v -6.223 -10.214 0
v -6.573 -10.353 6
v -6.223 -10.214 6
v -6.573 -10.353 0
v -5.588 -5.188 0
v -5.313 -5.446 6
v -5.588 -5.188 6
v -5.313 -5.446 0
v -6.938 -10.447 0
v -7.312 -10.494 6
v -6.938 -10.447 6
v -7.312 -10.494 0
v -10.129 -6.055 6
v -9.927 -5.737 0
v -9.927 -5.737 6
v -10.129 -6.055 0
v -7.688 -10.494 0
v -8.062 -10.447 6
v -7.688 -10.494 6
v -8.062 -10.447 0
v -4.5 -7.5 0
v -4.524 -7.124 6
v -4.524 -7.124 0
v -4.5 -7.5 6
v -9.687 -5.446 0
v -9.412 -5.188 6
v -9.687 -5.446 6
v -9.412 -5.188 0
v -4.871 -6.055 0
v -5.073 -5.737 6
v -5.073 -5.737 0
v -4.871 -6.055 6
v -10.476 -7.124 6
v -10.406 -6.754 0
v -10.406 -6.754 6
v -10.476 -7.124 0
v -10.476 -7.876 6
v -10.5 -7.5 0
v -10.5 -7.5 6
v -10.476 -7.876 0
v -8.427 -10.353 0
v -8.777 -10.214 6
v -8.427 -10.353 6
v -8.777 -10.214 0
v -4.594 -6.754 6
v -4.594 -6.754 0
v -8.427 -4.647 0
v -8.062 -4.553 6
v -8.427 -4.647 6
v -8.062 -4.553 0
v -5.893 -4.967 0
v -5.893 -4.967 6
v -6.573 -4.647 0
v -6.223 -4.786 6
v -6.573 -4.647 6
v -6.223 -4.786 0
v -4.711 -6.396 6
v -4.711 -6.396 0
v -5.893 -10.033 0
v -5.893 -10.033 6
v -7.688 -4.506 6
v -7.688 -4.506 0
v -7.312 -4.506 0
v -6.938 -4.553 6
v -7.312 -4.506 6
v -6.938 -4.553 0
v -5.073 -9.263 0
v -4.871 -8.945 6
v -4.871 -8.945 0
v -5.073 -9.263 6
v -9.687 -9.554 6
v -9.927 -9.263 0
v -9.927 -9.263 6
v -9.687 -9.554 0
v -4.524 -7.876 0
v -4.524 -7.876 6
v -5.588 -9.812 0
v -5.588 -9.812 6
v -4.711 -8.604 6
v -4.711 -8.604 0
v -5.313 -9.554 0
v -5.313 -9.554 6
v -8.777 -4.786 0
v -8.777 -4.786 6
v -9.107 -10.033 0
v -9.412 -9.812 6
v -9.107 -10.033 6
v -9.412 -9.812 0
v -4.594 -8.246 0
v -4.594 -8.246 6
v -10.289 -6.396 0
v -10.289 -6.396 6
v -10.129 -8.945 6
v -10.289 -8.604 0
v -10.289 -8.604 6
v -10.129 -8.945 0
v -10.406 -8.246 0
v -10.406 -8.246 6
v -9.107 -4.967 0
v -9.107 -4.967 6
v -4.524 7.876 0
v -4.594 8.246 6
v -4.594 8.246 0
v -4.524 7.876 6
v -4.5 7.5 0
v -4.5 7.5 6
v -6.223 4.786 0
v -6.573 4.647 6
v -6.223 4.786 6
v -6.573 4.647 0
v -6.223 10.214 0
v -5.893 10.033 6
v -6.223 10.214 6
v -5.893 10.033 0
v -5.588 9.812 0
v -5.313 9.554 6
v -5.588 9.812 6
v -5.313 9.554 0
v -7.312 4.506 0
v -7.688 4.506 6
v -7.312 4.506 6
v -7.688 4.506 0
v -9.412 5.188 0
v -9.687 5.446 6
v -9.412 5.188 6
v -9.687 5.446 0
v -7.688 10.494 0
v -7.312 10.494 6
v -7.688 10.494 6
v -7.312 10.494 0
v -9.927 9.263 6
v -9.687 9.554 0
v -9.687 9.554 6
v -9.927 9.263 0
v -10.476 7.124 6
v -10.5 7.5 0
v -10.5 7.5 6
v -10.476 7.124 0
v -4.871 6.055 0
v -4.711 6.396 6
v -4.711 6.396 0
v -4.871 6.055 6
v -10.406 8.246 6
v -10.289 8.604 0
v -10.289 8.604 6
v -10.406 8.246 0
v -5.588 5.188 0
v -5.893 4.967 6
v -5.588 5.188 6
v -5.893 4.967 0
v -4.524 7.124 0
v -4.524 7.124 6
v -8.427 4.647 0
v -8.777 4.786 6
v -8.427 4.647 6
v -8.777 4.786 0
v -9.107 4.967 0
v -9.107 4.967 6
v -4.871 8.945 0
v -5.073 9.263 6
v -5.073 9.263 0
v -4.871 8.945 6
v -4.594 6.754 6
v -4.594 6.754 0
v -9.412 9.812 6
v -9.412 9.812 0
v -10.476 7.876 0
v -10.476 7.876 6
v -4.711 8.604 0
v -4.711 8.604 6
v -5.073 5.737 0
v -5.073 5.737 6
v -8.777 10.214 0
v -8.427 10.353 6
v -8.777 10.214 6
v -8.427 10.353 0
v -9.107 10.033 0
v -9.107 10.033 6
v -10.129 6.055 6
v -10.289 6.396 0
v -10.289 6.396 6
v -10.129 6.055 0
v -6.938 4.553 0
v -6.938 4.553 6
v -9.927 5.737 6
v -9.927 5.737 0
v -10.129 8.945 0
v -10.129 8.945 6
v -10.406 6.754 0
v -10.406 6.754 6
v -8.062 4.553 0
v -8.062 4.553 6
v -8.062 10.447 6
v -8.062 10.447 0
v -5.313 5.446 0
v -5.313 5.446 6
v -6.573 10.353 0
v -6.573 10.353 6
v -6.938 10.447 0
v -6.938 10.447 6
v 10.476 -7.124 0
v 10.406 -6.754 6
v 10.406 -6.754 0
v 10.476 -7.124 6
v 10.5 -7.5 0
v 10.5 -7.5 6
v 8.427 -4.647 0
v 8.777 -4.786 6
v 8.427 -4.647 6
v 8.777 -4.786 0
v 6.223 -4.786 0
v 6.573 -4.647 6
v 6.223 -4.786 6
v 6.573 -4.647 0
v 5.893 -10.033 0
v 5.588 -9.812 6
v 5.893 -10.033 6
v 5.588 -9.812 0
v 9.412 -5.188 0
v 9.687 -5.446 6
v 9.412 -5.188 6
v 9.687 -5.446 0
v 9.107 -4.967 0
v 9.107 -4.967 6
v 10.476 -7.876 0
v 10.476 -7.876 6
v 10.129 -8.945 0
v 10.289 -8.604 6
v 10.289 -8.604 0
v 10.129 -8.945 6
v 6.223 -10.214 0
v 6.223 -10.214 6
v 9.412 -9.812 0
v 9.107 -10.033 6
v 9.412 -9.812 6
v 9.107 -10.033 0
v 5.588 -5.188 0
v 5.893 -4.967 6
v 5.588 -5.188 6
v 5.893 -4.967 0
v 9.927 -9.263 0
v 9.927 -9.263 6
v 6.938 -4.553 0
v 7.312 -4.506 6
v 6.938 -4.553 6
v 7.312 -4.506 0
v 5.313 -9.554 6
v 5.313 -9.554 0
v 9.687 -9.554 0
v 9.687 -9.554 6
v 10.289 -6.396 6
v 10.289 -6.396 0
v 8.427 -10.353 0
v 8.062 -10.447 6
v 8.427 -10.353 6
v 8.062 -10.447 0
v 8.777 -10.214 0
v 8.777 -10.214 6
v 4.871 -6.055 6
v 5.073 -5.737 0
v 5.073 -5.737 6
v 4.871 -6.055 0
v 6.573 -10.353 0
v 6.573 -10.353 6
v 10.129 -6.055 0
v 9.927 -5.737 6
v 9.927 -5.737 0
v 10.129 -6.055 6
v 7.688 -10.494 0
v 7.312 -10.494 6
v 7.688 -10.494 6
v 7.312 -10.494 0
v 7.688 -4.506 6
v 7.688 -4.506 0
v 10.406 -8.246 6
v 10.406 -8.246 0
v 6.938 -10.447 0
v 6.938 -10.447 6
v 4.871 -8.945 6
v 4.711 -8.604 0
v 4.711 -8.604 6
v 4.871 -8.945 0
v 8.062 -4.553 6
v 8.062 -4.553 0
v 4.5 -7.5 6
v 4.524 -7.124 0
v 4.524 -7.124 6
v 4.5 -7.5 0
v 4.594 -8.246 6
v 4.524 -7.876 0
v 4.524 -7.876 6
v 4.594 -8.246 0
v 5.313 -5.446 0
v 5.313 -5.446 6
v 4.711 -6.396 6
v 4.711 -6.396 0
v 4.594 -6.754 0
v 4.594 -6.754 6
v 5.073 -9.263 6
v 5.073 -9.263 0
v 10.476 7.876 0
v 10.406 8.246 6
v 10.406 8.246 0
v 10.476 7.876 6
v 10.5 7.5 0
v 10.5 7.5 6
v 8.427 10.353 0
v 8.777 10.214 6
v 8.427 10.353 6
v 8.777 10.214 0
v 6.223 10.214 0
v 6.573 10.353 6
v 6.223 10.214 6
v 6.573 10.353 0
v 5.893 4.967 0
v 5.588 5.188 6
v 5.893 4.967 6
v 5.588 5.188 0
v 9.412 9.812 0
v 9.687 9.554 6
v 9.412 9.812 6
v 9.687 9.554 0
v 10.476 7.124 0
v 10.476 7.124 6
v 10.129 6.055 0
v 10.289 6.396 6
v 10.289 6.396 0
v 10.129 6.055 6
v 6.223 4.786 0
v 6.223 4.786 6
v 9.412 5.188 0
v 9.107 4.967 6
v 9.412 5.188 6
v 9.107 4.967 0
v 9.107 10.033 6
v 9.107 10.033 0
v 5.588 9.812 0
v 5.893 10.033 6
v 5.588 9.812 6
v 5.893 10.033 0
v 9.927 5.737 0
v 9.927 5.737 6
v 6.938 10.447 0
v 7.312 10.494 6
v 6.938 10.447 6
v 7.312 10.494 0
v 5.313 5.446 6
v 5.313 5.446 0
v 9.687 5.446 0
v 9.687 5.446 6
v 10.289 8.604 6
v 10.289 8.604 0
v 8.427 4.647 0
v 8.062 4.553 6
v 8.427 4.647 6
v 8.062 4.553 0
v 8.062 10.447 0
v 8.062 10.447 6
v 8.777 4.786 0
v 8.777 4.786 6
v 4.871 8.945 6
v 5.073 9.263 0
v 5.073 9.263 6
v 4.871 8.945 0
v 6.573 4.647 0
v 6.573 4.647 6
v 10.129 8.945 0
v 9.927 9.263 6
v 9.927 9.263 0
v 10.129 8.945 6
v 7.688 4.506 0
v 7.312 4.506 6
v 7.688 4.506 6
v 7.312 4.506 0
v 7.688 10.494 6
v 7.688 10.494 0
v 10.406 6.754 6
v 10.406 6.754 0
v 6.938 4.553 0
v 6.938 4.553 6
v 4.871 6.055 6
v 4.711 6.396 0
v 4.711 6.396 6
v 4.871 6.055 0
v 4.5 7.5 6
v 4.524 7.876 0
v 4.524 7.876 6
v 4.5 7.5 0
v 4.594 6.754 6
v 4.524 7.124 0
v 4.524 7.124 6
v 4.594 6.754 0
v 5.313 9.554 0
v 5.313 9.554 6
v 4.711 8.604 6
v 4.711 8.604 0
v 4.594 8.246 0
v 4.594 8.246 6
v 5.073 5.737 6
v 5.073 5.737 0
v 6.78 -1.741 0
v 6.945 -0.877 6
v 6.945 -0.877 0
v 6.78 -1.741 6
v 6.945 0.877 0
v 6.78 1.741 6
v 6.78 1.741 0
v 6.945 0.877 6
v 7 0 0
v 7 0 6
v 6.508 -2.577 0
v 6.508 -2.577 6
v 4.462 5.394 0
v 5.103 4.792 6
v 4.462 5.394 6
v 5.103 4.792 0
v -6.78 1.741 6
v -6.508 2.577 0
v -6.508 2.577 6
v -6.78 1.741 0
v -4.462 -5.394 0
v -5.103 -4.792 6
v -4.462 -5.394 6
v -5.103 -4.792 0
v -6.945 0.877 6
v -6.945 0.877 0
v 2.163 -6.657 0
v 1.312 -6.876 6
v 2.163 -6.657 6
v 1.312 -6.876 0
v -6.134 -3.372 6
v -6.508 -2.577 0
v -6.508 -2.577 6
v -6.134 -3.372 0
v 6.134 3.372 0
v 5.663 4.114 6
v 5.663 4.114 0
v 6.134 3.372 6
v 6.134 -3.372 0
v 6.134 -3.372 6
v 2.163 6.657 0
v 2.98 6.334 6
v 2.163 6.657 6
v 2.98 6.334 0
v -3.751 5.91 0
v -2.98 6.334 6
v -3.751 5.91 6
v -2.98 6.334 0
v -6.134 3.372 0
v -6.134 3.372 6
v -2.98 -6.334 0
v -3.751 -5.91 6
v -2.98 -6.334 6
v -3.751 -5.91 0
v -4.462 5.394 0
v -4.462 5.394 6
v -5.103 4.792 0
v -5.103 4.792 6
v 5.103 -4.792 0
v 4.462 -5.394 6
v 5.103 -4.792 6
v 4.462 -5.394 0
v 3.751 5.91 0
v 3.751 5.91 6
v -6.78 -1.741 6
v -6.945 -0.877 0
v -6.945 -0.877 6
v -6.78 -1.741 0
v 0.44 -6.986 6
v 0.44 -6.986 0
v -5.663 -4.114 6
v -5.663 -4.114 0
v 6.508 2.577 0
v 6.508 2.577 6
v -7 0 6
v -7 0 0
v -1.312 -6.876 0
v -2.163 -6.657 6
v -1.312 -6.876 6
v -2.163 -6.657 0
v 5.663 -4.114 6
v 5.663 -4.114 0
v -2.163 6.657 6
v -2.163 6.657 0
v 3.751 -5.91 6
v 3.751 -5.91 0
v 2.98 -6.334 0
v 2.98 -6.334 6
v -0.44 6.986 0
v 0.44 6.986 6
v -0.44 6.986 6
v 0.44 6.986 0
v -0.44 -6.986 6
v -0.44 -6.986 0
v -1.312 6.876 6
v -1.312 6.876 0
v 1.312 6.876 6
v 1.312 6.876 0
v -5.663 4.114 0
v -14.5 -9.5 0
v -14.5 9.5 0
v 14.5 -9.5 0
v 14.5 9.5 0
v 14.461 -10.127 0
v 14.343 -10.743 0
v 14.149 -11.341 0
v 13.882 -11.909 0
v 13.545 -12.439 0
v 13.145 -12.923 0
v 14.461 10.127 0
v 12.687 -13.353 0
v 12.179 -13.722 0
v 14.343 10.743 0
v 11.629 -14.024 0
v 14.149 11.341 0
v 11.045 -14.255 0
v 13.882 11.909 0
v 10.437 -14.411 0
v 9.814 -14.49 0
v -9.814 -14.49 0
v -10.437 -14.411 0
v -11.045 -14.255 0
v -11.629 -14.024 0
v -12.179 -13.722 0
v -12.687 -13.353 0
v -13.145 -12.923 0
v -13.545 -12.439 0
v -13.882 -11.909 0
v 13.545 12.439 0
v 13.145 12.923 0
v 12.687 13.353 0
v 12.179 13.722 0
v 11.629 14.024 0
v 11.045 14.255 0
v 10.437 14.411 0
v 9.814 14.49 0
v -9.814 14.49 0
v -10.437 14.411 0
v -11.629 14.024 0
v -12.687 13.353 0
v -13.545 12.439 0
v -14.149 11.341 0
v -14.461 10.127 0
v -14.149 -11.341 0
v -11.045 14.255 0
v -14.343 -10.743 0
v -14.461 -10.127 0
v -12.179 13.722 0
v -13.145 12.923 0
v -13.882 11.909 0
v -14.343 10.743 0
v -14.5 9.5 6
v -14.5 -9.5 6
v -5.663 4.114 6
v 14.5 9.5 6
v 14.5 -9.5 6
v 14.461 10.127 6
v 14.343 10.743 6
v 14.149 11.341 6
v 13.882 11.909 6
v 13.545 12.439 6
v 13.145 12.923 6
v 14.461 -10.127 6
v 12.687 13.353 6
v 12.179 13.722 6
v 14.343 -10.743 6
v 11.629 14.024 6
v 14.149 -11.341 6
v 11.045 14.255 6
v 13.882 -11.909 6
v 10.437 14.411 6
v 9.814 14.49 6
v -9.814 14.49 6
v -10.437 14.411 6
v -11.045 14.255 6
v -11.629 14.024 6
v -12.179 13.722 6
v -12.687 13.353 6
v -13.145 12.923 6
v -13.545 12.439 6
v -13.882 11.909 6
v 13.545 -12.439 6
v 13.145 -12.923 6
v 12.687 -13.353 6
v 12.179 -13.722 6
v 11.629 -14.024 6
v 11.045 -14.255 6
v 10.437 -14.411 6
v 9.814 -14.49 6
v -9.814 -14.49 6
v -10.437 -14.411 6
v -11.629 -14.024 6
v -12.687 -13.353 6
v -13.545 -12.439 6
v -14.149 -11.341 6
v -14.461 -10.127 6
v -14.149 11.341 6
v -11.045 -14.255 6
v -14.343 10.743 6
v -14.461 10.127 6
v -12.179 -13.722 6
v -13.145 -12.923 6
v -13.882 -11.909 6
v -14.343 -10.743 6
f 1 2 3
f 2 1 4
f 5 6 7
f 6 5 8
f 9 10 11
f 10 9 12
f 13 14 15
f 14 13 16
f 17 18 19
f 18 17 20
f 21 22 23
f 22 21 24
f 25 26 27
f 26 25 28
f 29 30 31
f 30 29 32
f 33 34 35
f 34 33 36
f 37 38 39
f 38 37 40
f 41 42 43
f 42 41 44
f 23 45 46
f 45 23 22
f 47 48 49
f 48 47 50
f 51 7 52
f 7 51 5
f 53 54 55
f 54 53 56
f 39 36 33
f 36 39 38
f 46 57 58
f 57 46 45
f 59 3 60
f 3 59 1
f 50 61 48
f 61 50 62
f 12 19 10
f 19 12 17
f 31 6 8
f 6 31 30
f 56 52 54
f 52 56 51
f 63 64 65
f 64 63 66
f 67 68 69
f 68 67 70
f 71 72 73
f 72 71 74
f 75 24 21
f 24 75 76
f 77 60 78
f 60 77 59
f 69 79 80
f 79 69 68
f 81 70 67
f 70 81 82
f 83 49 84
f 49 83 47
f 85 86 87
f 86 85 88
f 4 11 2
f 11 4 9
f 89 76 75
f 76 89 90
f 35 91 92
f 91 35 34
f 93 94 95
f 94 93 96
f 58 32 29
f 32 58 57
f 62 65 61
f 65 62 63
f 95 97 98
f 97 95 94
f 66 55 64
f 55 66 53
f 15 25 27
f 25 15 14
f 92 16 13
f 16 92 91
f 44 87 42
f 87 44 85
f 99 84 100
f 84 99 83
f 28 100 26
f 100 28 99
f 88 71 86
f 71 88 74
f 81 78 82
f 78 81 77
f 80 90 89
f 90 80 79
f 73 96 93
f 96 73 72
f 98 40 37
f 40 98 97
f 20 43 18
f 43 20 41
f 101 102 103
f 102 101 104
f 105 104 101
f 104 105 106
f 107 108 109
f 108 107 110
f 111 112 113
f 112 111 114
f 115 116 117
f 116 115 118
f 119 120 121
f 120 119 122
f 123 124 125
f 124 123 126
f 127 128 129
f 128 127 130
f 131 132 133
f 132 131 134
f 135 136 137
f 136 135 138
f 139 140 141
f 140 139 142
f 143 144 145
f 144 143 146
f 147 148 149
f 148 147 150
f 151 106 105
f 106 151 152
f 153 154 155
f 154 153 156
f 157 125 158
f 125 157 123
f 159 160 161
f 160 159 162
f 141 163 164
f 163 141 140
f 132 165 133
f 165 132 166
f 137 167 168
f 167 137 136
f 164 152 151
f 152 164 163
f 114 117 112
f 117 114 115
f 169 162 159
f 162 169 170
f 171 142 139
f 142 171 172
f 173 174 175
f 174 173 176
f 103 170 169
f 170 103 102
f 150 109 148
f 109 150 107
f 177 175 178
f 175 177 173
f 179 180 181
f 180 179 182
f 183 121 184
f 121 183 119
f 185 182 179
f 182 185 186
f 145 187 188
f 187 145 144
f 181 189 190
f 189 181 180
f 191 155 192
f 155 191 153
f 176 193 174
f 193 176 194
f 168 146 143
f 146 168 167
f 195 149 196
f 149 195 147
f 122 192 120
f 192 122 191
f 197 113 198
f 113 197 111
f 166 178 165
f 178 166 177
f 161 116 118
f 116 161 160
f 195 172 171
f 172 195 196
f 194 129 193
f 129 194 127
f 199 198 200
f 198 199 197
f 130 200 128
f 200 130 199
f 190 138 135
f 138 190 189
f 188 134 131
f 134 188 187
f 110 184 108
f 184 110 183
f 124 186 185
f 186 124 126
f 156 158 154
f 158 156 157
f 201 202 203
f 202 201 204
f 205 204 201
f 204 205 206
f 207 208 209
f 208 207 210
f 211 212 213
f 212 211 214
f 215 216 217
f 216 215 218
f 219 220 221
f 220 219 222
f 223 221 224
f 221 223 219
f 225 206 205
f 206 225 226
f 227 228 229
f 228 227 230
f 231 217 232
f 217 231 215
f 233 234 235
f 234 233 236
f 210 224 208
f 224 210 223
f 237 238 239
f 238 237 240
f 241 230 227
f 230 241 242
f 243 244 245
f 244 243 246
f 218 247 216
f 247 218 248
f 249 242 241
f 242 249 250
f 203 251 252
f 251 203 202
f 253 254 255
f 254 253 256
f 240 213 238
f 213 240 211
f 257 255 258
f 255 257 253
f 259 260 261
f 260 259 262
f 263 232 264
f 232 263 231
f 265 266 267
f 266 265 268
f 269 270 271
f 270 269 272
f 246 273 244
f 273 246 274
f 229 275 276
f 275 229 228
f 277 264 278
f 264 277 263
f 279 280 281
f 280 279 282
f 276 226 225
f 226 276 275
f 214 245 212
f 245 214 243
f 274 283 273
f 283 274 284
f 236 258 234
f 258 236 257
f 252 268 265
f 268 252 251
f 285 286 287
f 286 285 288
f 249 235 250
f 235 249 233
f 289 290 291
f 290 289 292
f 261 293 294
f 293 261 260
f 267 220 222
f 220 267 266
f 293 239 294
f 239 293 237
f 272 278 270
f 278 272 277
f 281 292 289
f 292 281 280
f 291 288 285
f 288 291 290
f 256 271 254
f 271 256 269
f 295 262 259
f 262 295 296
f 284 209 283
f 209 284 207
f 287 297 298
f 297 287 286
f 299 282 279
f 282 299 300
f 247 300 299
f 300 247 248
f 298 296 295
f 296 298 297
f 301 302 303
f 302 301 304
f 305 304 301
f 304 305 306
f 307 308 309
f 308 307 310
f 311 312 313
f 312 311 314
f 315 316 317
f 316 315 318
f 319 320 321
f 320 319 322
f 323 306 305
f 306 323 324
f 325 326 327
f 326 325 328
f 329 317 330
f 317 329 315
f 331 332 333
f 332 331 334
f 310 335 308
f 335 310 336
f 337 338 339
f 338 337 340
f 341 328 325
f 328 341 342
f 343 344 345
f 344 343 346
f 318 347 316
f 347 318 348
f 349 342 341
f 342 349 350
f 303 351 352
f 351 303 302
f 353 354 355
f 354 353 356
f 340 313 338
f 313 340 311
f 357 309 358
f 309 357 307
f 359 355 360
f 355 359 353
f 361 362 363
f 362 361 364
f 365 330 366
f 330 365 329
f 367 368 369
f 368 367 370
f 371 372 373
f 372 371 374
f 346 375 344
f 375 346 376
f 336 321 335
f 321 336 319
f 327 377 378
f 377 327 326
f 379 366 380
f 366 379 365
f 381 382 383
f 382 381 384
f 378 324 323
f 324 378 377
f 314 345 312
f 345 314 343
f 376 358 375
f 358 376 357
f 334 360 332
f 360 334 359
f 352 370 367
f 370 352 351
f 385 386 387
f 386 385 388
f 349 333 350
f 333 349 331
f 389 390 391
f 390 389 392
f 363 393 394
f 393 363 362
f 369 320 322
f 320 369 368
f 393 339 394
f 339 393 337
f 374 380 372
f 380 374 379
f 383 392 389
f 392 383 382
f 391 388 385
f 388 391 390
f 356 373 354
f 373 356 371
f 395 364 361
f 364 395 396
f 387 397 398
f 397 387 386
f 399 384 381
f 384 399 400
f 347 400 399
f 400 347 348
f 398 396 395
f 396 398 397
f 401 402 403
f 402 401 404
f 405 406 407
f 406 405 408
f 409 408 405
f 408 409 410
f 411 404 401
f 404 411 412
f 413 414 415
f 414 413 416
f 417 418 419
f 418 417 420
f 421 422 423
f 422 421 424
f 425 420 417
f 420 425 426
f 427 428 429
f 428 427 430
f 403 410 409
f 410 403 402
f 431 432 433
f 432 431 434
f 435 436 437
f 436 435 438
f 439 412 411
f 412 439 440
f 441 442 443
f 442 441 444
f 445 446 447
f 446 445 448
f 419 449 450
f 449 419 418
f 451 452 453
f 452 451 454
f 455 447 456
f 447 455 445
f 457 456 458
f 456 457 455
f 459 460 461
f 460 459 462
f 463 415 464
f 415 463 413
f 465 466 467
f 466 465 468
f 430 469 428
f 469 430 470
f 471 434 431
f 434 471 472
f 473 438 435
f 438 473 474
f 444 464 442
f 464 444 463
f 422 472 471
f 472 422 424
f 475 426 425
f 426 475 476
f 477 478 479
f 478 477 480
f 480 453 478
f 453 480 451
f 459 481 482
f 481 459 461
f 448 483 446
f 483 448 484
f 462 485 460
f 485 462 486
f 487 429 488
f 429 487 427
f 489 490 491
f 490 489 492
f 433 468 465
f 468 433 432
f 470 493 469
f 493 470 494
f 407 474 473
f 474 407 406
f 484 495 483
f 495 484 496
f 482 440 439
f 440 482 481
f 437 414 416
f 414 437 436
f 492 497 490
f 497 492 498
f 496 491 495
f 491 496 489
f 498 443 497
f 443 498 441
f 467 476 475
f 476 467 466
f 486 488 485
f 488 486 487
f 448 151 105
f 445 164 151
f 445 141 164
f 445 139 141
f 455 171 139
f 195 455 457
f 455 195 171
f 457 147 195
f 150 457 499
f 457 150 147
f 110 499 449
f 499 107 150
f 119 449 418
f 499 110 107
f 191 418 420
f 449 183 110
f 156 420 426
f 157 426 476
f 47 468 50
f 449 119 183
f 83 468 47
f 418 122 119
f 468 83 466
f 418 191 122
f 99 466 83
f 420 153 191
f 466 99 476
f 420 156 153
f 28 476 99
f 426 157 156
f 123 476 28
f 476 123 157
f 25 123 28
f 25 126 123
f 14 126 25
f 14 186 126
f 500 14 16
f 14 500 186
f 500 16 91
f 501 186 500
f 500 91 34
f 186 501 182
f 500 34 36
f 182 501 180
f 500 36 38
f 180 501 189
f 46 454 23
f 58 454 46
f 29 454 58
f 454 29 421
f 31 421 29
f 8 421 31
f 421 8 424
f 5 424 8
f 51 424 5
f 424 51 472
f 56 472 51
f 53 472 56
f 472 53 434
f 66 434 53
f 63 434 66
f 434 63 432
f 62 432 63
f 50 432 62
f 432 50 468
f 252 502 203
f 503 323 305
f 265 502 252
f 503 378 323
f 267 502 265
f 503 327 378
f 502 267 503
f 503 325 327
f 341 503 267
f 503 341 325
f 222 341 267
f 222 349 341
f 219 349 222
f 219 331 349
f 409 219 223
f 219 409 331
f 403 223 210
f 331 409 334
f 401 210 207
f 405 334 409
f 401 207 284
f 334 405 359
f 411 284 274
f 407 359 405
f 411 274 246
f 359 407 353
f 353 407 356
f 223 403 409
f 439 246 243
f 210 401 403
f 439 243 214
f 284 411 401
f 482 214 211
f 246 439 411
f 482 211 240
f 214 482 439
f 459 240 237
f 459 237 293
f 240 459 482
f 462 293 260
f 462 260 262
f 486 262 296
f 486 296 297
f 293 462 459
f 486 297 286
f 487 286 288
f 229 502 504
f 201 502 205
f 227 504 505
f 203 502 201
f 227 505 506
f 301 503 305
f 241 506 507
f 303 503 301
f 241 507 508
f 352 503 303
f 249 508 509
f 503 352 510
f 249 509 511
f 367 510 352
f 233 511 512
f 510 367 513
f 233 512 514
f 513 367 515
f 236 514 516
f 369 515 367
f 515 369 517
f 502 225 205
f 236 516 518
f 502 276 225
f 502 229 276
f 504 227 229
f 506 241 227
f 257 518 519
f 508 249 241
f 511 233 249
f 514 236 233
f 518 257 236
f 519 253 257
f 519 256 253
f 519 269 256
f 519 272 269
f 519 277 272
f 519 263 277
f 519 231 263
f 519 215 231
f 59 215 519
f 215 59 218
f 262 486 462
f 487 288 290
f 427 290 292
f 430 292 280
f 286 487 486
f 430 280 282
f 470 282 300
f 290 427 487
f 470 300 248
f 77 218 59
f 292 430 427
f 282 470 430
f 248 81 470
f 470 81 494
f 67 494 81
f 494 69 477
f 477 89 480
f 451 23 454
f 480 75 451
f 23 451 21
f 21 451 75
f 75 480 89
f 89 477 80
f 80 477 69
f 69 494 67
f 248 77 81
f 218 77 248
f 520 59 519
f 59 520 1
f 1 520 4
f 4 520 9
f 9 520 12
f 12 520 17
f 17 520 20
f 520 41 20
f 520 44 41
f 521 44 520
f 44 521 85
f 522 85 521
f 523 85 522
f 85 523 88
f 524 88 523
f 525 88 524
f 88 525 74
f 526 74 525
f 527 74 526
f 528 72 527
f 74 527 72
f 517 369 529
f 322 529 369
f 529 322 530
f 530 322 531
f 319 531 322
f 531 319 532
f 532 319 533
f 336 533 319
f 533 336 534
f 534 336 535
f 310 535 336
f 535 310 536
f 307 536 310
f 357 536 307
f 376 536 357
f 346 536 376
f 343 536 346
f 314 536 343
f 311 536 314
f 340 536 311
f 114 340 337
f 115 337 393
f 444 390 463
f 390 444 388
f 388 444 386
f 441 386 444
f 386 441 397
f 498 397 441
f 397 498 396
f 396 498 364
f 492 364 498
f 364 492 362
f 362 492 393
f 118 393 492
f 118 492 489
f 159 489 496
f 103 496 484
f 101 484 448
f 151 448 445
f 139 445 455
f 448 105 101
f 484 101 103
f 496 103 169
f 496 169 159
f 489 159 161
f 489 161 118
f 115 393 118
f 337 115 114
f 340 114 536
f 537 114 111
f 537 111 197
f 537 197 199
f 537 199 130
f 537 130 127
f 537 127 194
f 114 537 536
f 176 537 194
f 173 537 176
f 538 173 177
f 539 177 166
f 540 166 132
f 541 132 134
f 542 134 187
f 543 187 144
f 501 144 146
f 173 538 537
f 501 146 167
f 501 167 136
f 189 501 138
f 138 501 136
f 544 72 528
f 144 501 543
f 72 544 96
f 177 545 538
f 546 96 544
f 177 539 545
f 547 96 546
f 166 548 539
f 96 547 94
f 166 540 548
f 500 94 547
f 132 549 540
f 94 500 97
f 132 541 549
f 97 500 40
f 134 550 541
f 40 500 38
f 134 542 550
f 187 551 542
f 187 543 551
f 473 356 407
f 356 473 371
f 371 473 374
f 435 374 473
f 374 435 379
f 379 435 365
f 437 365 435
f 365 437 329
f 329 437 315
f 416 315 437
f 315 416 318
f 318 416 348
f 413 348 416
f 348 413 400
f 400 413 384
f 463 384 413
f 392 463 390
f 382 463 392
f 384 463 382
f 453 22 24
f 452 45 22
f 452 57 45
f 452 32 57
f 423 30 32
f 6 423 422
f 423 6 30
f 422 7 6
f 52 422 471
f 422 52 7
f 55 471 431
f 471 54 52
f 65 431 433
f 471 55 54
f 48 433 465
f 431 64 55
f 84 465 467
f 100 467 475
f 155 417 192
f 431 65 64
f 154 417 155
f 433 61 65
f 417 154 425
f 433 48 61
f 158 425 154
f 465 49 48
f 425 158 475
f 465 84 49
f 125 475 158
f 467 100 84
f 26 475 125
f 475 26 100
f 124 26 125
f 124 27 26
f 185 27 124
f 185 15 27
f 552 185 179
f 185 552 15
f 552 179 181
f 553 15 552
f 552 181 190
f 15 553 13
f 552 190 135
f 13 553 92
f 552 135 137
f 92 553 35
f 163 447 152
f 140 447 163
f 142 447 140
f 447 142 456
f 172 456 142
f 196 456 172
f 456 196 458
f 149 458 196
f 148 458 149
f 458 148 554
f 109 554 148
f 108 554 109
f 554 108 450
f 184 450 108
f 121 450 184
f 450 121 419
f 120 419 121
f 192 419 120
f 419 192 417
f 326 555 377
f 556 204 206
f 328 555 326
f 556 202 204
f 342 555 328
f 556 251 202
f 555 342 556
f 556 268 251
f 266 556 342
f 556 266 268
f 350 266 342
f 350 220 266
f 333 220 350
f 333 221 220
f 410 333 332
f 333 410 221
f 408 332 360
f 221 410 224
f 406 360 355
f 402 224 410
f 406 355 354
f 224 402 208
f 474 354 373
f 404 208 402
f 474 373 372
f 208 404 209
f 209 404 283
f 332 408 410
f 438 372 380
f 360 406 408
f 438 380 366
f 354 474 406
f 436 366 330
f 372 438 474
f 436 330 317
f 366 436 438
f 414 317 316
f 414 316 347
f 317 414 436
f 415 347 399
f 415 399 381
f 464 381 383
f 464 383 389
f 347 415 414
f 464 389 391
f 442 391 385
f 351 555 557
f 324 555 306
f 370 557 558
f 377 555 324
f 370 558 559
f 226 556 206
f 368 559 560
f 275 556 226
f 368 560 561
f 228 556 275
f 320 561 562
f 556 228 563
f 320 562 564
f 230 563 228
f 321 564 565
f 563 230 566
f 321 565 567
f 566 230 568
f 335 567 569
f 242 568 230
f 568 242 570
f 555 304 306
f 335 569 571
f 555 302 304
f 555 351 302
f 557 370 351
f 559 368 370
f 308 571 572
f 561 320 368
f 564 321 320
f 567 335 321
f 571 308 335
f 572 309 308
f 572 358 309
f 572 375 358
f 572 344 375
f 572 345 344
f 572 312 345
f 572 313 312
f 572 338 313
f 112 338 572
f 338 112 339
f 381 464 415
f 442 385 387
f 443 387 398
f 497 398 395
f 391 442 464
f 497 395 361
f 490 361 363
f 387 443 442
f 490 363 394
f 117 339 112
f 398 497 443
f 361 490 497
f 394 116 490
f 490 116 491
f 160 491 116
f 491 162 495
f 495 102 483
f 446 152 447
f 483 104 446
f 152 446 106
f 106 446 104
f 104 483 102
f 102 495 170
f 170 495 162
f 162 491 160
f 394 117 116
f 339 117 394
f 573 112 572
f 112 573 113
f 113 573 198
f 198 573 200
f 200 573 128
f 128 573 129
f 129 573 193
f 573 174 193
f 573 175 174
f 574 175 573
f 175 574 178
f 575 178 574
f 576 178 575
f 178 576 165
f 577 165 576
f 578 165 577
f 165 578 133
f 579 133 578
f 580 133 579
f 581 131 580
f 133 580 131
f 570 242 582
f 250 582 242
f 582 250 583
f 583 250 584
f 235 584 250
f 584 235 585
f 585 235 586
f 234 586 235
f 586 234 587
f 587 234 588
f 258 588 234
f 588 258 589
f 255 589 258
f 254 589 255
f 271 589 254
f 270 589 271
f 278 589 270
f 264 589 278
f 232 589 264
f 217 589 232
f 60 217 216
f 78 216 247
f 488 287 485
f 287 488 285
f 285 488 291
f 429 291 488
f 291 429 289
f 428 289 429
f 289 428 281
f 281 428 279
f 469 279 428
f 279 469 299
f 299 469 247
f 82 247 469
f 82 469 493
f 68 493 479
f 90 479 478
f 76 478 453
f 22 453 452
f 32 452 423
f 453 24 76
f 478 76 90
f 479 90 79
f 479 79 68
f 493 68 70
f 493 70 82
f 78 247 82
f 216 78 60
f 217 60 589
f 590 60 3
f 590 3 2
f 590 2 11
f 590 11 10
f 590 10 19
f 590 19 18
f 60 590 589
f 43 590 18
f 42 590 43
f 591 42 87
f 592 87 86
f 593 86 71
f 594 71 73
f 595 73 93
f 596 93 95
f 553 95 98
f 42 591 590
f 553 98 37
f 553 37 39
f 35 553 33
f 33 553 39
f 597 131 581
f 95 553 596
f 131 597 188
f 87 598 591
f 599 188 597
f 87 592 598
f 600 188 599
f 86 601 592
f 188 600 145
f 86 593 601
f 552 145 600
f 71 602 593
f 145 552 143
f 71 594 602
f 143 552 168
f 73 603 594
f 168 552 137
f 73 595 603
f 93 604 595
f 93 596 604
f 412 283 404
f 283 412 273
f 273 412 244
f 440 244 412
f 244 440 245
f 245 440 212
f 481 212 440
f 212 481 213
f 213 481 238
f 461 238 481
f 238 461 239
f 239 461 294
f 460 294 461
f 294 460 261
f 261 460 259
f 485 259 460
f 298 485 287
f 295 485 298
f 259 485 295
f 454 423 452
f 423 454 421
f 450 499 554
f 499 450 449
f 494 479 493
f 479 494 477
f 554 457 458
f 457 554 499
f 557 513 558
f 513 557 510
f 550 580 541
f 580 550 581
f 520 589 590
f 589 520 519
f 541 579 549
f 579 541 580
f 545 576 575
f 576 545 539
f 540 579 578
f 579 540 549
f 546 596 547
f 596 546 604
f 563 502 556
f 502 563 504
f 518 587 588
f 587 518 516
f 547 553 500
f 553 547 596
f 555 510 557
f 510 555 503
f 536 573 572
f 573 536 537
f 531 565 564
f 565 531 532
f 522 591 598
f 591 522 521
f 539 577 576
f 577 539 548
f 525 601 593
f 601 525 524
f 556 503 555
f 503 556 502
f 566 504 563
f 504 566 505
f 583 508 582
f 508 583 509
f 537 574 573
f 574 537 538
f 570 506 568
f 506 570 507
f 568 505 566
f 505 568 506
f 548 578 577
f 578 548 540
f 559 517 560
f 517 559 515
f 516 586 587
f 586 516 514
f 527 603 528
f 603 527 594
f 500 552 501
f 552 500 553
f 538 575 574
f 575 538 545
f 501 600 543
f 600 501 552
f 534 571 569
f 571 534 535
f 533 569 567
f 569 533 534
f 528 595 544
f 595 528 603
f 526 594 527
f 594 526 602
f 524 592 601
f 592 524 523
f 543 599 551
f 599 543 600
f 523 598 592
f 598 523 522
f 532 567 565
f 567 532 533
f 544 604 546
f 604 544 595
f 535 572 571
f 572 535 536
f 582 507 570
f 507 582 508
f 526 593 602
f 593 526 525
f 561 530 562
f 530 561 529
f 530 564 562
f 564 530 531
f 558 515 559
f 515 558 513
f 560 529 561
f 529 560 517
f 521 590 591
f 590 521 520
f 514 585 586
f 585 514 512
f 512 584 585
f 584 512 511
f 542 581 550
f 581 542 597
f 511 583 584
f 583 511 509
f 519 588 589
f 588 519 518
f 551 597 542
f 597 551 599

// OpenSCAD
$fn = 50;


difference() {
	union() {
		hull() {
			translate(v = [-9.5000000000, 9.5000000000, 0]) {
				cylinder(h = 6, r = 5);
			}
			translate(v = [9.5000000000, 9.5000000000, 0]) {
				cylinder(h = 6, r = 5);
			}
			translate(v = [-9.5000000000, -9.5000000000, 0]) {
				cylinder(h = 6, r = 5);
			}
			translate(v = [9.5000000000, -9.5000000000, 0]) {
				cylinder(h = 6, r = 5);
			}
		}
	}
	union() {
		#translate(v = [-7.5000000000, -7.5000000000, -100.0000000000]) {
			cylinder(h = 200, r = 3.0000000000);
		}
		#translate(v = [-7.5000000000, 7.5000000000, -100.0000000000]) {
			cylinder(h = 200, r = 3.0000000000);
		}
		#translate(v = [7.5000000000, -7.5000000000, -100.0000000000]) {
			cylinder(h = 200, r = 3.0000000000);
		}
		#translate(v = [7.5000000000, 7.5000000000, -100.0000000000]) {
			cylinder(h = 200, r = 3.0000000000);
		}
		#cylinder(h = 6, r = 7.0000000000);
	}
}
